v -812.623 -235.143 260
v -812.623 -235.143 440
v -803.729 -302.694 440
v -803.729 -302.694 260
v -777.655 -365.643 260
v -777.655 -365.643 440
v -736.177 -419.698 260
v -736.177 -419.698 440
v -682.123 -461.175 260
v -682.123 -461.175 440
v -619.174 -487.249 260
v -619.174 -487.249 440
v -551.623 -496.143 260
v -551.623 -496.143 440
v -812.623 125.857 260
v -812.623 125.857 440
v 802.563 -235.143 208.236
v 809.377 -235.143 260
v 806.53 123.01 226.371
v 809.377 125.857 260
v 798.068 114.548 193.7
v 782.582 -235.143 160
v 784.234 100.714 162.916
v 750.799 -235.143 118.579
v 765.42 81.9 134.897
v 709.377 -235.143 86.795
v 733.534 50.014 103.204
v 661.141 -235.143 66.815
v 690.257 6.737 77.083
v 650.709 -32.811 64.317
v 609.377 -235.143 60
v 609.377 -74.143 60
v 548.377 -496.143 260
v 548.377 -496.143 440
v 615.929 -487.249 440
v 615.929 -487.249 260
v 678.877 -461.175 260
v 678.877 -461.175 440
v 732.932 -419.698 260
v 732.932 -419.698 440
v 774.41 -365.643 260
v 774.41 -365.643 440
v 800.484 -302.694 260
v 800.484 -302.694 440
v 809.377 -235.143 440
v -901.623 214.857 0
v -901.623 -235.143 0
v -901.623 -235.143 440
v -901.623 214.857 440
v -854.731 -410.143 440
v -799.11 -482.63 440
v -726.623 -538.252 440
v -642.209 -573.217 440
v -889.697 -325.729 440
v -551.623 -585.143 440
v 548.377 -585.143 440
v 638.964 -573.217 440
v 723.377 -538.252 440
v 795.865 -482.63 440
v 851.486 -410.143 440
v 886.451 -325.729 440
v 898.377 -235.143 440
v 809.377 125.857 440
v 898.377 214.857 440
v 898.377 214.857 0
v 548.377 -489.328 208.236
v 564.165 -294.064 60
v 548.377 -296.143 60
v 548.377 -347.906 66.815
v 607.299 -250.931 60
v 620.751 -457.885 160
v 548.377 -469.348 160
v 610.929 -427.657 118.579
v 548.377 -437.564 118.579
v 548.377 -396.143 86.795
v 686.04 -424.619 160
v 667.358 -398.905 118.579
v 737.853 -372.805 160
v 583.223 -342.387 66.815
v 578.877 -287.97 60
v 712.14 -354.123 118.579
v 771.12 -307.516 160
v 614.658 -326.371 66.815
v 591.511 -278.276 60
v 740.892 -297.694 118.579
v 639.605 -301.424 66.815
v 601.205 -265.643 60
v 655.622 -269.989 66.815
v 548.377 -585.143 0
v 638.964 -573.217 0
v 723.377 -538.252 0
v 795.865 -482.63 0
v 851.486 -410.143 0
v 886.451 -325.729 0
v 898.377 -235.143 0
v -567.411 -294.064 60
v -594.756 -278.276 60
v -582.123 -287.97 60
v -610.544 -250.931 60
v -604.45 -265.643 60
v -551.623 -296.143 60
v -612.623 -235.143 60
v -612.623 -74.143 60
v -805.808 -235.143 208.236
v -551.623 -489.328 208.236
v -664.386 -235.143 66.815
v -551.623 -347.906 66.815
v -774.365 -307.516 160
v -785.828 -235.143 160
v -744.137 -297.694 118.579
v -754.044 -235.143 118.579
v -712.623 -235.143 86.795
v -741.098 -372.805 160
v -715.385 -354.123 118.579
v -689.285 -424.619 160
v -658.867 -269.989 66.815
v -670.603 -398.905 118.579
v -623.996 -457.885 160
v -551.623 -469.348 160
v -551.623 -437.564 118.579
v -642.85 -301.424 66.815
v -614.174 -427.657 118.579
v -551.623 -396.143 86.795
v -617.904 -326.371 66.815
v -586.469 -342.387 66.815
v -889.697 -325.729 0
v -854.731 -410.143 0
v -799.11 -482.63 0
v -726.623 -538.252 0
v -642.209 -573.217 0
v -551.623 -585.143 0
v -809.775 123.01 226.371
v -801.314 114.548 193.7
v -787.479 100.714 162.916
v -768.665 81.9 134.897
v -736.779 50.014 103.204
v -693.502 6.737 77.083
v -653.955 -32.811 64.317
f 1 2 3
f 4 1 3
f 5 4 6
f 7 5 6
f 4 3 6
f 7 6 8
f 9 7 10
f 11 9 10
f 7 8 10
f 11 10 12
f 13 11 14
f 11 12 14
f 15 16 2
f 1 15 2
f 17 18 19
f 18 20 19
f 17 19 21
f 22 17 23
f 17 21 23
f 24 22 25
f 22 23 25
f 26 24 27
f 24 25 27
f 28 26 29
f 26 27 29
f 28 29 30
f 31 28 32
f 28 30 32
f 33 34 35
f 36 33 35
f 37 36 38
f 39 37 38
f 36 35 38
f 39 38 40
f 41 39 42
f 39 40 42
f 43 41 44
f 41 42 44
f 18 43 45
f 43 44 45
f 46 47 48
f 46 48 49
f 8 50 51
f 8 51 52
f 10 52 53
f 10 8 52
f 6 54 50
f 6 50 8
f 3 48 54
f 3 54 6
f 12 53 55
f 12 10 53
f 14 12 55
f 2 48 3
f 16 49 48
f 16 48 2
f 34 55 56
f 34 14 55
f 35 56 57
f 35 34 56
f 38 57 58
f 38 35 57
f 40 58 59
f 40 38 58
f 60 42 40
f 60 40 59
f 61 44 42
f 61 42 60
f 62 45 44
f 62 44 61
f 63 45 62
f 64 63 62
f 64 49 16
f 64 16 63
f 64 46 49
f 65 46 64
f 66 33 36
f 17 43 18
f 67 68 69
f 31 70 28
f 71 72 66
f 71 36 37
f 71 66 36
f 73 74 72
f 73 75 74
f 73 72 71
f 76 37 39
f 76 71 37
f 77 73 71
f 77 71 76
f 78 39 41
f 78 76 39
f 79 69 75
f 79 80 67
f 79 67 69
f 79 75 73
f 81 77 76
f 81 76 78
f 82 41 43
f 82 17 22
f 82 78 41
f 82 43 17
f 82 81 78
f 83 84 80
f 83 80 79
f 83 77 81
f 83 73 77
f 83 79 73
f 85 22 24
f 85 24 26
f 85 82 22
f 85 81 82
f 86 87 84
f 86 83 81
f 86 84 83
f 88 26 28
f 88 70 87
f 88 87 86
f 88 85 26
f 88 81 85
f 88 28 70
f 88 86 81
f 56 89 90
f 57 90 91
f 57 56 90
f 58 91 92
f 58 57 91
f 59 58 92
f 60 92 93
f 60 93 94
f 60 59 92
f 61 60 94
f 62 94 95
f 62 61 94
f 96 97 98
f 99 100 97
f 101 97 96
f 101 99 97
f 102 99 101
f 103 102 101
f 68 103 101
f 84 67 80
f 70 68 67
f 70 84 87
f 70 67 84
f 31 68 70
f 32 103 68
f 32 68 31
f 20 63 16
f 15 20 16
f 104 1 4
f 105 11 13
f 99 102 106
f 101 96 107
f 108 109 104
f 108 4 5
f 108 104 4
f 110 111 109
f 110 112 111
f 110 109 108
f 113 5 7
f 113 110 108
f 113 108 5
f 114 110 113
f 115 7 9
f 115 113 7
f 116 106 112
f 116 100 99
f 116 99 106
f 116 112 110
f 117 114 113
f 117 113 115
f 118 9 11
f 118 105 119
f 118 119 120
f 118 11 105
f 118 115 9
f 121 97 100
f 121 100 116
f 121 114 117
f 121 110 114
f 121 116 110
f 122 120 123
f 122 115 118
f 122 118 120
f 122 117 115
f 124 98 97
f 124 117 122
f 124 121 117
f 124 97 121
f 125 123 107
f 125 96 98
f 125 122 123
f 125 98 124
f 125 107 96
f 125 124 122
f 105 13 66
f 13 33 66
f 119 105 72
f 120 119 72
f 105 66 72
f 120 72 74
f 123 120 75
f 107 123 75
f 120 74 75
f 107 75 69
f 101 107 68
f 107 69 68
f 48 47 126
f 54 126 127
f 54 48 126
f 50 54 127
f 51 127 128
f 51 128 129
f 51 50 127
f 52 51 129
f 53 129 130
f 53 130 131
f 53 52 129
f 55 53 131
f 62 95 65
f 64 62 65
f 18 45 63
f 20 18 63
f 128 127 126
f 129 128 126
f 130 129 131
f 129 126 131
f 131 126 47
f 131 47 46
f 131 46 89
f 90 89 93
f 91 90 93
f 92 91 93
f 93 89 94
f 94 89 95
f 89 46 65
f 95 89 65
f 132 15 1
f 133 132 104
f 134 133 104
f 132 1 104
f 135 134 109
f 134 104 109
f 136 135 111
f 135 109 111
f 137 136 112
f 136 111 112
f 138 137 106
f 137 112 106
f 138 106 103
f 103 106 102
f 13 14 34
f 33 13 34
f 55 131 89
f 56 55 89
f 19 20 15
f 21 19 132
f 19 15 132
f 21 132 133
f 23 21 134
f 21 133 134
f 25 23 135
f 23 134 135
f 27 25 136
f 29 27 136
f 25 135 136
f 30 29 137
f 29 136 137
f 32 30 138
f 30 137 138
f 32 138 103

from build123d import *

# Parameters (mm, degrees)
F0_W     = 1800
F0_H     = 800
F1_DEPTH = 440
F2_R     = 350
F4_DEPTH = 380
F5_R     = 200


with BuildPart() as f1:
    # F0 (on Top) → F1 (new body)
    with BuildSketch(Plane.XY):
        with Locations((-1.622595, -185.142654)):
            Rectangle(F0_W, F0_H)
    extrude(amount=F1_DEPTH)

    # F2
    f2_edges = [f1.edges().sort_by_distance(p)[0] for p in [
        (-901.622595, -585.142654, 220),
        (898.377405, -585.142654, 220),
    ]]
    fillet(f2_edges, radius=F2_R)

    # F3 (on face) → F4 (cut)
    with BuildSketch(Plane.XY.offset(440)):
        with BuildLine():
            Line((809.377417, 125.857358), (-812.622607, 125.857358))
            Line((-812.622607, 125.857358), (-812.622607, -235.142654))
            ThreePointArc((-812.622607, -235.142654), (-736.177473, -419.697533), (-551.622595, -496.142666))
            Line((-551.622595, -496.142666), (548.377405, -496.142666))
            ThreePointArc((548.377405, -496.142666), (732.932283, -419.697533), (809.377417, -235.142654))
            Line((809.377417, -235.142654), (809.377417, 125.857358))
        make_face()
    extrude(amount=-F4_DEPTH, mode=Mode.SUBTRACT)

    # F5
    f5_edges = [f1.edges().sort_by_distance(p)[0] for p in [
        (-812.622607, -54.642648, 60),
        (-736.177473, -419.697533, 60),
        (-1.622595, 125.857358, 60),
        (809.377417, -54.642648, 60),
        (732.932283, -419.697533, 60),
        (-1.622595, -496.142666, 60),
    ]]
    fillet(f5_edges, radius=F5_R)


solid = f1.part
